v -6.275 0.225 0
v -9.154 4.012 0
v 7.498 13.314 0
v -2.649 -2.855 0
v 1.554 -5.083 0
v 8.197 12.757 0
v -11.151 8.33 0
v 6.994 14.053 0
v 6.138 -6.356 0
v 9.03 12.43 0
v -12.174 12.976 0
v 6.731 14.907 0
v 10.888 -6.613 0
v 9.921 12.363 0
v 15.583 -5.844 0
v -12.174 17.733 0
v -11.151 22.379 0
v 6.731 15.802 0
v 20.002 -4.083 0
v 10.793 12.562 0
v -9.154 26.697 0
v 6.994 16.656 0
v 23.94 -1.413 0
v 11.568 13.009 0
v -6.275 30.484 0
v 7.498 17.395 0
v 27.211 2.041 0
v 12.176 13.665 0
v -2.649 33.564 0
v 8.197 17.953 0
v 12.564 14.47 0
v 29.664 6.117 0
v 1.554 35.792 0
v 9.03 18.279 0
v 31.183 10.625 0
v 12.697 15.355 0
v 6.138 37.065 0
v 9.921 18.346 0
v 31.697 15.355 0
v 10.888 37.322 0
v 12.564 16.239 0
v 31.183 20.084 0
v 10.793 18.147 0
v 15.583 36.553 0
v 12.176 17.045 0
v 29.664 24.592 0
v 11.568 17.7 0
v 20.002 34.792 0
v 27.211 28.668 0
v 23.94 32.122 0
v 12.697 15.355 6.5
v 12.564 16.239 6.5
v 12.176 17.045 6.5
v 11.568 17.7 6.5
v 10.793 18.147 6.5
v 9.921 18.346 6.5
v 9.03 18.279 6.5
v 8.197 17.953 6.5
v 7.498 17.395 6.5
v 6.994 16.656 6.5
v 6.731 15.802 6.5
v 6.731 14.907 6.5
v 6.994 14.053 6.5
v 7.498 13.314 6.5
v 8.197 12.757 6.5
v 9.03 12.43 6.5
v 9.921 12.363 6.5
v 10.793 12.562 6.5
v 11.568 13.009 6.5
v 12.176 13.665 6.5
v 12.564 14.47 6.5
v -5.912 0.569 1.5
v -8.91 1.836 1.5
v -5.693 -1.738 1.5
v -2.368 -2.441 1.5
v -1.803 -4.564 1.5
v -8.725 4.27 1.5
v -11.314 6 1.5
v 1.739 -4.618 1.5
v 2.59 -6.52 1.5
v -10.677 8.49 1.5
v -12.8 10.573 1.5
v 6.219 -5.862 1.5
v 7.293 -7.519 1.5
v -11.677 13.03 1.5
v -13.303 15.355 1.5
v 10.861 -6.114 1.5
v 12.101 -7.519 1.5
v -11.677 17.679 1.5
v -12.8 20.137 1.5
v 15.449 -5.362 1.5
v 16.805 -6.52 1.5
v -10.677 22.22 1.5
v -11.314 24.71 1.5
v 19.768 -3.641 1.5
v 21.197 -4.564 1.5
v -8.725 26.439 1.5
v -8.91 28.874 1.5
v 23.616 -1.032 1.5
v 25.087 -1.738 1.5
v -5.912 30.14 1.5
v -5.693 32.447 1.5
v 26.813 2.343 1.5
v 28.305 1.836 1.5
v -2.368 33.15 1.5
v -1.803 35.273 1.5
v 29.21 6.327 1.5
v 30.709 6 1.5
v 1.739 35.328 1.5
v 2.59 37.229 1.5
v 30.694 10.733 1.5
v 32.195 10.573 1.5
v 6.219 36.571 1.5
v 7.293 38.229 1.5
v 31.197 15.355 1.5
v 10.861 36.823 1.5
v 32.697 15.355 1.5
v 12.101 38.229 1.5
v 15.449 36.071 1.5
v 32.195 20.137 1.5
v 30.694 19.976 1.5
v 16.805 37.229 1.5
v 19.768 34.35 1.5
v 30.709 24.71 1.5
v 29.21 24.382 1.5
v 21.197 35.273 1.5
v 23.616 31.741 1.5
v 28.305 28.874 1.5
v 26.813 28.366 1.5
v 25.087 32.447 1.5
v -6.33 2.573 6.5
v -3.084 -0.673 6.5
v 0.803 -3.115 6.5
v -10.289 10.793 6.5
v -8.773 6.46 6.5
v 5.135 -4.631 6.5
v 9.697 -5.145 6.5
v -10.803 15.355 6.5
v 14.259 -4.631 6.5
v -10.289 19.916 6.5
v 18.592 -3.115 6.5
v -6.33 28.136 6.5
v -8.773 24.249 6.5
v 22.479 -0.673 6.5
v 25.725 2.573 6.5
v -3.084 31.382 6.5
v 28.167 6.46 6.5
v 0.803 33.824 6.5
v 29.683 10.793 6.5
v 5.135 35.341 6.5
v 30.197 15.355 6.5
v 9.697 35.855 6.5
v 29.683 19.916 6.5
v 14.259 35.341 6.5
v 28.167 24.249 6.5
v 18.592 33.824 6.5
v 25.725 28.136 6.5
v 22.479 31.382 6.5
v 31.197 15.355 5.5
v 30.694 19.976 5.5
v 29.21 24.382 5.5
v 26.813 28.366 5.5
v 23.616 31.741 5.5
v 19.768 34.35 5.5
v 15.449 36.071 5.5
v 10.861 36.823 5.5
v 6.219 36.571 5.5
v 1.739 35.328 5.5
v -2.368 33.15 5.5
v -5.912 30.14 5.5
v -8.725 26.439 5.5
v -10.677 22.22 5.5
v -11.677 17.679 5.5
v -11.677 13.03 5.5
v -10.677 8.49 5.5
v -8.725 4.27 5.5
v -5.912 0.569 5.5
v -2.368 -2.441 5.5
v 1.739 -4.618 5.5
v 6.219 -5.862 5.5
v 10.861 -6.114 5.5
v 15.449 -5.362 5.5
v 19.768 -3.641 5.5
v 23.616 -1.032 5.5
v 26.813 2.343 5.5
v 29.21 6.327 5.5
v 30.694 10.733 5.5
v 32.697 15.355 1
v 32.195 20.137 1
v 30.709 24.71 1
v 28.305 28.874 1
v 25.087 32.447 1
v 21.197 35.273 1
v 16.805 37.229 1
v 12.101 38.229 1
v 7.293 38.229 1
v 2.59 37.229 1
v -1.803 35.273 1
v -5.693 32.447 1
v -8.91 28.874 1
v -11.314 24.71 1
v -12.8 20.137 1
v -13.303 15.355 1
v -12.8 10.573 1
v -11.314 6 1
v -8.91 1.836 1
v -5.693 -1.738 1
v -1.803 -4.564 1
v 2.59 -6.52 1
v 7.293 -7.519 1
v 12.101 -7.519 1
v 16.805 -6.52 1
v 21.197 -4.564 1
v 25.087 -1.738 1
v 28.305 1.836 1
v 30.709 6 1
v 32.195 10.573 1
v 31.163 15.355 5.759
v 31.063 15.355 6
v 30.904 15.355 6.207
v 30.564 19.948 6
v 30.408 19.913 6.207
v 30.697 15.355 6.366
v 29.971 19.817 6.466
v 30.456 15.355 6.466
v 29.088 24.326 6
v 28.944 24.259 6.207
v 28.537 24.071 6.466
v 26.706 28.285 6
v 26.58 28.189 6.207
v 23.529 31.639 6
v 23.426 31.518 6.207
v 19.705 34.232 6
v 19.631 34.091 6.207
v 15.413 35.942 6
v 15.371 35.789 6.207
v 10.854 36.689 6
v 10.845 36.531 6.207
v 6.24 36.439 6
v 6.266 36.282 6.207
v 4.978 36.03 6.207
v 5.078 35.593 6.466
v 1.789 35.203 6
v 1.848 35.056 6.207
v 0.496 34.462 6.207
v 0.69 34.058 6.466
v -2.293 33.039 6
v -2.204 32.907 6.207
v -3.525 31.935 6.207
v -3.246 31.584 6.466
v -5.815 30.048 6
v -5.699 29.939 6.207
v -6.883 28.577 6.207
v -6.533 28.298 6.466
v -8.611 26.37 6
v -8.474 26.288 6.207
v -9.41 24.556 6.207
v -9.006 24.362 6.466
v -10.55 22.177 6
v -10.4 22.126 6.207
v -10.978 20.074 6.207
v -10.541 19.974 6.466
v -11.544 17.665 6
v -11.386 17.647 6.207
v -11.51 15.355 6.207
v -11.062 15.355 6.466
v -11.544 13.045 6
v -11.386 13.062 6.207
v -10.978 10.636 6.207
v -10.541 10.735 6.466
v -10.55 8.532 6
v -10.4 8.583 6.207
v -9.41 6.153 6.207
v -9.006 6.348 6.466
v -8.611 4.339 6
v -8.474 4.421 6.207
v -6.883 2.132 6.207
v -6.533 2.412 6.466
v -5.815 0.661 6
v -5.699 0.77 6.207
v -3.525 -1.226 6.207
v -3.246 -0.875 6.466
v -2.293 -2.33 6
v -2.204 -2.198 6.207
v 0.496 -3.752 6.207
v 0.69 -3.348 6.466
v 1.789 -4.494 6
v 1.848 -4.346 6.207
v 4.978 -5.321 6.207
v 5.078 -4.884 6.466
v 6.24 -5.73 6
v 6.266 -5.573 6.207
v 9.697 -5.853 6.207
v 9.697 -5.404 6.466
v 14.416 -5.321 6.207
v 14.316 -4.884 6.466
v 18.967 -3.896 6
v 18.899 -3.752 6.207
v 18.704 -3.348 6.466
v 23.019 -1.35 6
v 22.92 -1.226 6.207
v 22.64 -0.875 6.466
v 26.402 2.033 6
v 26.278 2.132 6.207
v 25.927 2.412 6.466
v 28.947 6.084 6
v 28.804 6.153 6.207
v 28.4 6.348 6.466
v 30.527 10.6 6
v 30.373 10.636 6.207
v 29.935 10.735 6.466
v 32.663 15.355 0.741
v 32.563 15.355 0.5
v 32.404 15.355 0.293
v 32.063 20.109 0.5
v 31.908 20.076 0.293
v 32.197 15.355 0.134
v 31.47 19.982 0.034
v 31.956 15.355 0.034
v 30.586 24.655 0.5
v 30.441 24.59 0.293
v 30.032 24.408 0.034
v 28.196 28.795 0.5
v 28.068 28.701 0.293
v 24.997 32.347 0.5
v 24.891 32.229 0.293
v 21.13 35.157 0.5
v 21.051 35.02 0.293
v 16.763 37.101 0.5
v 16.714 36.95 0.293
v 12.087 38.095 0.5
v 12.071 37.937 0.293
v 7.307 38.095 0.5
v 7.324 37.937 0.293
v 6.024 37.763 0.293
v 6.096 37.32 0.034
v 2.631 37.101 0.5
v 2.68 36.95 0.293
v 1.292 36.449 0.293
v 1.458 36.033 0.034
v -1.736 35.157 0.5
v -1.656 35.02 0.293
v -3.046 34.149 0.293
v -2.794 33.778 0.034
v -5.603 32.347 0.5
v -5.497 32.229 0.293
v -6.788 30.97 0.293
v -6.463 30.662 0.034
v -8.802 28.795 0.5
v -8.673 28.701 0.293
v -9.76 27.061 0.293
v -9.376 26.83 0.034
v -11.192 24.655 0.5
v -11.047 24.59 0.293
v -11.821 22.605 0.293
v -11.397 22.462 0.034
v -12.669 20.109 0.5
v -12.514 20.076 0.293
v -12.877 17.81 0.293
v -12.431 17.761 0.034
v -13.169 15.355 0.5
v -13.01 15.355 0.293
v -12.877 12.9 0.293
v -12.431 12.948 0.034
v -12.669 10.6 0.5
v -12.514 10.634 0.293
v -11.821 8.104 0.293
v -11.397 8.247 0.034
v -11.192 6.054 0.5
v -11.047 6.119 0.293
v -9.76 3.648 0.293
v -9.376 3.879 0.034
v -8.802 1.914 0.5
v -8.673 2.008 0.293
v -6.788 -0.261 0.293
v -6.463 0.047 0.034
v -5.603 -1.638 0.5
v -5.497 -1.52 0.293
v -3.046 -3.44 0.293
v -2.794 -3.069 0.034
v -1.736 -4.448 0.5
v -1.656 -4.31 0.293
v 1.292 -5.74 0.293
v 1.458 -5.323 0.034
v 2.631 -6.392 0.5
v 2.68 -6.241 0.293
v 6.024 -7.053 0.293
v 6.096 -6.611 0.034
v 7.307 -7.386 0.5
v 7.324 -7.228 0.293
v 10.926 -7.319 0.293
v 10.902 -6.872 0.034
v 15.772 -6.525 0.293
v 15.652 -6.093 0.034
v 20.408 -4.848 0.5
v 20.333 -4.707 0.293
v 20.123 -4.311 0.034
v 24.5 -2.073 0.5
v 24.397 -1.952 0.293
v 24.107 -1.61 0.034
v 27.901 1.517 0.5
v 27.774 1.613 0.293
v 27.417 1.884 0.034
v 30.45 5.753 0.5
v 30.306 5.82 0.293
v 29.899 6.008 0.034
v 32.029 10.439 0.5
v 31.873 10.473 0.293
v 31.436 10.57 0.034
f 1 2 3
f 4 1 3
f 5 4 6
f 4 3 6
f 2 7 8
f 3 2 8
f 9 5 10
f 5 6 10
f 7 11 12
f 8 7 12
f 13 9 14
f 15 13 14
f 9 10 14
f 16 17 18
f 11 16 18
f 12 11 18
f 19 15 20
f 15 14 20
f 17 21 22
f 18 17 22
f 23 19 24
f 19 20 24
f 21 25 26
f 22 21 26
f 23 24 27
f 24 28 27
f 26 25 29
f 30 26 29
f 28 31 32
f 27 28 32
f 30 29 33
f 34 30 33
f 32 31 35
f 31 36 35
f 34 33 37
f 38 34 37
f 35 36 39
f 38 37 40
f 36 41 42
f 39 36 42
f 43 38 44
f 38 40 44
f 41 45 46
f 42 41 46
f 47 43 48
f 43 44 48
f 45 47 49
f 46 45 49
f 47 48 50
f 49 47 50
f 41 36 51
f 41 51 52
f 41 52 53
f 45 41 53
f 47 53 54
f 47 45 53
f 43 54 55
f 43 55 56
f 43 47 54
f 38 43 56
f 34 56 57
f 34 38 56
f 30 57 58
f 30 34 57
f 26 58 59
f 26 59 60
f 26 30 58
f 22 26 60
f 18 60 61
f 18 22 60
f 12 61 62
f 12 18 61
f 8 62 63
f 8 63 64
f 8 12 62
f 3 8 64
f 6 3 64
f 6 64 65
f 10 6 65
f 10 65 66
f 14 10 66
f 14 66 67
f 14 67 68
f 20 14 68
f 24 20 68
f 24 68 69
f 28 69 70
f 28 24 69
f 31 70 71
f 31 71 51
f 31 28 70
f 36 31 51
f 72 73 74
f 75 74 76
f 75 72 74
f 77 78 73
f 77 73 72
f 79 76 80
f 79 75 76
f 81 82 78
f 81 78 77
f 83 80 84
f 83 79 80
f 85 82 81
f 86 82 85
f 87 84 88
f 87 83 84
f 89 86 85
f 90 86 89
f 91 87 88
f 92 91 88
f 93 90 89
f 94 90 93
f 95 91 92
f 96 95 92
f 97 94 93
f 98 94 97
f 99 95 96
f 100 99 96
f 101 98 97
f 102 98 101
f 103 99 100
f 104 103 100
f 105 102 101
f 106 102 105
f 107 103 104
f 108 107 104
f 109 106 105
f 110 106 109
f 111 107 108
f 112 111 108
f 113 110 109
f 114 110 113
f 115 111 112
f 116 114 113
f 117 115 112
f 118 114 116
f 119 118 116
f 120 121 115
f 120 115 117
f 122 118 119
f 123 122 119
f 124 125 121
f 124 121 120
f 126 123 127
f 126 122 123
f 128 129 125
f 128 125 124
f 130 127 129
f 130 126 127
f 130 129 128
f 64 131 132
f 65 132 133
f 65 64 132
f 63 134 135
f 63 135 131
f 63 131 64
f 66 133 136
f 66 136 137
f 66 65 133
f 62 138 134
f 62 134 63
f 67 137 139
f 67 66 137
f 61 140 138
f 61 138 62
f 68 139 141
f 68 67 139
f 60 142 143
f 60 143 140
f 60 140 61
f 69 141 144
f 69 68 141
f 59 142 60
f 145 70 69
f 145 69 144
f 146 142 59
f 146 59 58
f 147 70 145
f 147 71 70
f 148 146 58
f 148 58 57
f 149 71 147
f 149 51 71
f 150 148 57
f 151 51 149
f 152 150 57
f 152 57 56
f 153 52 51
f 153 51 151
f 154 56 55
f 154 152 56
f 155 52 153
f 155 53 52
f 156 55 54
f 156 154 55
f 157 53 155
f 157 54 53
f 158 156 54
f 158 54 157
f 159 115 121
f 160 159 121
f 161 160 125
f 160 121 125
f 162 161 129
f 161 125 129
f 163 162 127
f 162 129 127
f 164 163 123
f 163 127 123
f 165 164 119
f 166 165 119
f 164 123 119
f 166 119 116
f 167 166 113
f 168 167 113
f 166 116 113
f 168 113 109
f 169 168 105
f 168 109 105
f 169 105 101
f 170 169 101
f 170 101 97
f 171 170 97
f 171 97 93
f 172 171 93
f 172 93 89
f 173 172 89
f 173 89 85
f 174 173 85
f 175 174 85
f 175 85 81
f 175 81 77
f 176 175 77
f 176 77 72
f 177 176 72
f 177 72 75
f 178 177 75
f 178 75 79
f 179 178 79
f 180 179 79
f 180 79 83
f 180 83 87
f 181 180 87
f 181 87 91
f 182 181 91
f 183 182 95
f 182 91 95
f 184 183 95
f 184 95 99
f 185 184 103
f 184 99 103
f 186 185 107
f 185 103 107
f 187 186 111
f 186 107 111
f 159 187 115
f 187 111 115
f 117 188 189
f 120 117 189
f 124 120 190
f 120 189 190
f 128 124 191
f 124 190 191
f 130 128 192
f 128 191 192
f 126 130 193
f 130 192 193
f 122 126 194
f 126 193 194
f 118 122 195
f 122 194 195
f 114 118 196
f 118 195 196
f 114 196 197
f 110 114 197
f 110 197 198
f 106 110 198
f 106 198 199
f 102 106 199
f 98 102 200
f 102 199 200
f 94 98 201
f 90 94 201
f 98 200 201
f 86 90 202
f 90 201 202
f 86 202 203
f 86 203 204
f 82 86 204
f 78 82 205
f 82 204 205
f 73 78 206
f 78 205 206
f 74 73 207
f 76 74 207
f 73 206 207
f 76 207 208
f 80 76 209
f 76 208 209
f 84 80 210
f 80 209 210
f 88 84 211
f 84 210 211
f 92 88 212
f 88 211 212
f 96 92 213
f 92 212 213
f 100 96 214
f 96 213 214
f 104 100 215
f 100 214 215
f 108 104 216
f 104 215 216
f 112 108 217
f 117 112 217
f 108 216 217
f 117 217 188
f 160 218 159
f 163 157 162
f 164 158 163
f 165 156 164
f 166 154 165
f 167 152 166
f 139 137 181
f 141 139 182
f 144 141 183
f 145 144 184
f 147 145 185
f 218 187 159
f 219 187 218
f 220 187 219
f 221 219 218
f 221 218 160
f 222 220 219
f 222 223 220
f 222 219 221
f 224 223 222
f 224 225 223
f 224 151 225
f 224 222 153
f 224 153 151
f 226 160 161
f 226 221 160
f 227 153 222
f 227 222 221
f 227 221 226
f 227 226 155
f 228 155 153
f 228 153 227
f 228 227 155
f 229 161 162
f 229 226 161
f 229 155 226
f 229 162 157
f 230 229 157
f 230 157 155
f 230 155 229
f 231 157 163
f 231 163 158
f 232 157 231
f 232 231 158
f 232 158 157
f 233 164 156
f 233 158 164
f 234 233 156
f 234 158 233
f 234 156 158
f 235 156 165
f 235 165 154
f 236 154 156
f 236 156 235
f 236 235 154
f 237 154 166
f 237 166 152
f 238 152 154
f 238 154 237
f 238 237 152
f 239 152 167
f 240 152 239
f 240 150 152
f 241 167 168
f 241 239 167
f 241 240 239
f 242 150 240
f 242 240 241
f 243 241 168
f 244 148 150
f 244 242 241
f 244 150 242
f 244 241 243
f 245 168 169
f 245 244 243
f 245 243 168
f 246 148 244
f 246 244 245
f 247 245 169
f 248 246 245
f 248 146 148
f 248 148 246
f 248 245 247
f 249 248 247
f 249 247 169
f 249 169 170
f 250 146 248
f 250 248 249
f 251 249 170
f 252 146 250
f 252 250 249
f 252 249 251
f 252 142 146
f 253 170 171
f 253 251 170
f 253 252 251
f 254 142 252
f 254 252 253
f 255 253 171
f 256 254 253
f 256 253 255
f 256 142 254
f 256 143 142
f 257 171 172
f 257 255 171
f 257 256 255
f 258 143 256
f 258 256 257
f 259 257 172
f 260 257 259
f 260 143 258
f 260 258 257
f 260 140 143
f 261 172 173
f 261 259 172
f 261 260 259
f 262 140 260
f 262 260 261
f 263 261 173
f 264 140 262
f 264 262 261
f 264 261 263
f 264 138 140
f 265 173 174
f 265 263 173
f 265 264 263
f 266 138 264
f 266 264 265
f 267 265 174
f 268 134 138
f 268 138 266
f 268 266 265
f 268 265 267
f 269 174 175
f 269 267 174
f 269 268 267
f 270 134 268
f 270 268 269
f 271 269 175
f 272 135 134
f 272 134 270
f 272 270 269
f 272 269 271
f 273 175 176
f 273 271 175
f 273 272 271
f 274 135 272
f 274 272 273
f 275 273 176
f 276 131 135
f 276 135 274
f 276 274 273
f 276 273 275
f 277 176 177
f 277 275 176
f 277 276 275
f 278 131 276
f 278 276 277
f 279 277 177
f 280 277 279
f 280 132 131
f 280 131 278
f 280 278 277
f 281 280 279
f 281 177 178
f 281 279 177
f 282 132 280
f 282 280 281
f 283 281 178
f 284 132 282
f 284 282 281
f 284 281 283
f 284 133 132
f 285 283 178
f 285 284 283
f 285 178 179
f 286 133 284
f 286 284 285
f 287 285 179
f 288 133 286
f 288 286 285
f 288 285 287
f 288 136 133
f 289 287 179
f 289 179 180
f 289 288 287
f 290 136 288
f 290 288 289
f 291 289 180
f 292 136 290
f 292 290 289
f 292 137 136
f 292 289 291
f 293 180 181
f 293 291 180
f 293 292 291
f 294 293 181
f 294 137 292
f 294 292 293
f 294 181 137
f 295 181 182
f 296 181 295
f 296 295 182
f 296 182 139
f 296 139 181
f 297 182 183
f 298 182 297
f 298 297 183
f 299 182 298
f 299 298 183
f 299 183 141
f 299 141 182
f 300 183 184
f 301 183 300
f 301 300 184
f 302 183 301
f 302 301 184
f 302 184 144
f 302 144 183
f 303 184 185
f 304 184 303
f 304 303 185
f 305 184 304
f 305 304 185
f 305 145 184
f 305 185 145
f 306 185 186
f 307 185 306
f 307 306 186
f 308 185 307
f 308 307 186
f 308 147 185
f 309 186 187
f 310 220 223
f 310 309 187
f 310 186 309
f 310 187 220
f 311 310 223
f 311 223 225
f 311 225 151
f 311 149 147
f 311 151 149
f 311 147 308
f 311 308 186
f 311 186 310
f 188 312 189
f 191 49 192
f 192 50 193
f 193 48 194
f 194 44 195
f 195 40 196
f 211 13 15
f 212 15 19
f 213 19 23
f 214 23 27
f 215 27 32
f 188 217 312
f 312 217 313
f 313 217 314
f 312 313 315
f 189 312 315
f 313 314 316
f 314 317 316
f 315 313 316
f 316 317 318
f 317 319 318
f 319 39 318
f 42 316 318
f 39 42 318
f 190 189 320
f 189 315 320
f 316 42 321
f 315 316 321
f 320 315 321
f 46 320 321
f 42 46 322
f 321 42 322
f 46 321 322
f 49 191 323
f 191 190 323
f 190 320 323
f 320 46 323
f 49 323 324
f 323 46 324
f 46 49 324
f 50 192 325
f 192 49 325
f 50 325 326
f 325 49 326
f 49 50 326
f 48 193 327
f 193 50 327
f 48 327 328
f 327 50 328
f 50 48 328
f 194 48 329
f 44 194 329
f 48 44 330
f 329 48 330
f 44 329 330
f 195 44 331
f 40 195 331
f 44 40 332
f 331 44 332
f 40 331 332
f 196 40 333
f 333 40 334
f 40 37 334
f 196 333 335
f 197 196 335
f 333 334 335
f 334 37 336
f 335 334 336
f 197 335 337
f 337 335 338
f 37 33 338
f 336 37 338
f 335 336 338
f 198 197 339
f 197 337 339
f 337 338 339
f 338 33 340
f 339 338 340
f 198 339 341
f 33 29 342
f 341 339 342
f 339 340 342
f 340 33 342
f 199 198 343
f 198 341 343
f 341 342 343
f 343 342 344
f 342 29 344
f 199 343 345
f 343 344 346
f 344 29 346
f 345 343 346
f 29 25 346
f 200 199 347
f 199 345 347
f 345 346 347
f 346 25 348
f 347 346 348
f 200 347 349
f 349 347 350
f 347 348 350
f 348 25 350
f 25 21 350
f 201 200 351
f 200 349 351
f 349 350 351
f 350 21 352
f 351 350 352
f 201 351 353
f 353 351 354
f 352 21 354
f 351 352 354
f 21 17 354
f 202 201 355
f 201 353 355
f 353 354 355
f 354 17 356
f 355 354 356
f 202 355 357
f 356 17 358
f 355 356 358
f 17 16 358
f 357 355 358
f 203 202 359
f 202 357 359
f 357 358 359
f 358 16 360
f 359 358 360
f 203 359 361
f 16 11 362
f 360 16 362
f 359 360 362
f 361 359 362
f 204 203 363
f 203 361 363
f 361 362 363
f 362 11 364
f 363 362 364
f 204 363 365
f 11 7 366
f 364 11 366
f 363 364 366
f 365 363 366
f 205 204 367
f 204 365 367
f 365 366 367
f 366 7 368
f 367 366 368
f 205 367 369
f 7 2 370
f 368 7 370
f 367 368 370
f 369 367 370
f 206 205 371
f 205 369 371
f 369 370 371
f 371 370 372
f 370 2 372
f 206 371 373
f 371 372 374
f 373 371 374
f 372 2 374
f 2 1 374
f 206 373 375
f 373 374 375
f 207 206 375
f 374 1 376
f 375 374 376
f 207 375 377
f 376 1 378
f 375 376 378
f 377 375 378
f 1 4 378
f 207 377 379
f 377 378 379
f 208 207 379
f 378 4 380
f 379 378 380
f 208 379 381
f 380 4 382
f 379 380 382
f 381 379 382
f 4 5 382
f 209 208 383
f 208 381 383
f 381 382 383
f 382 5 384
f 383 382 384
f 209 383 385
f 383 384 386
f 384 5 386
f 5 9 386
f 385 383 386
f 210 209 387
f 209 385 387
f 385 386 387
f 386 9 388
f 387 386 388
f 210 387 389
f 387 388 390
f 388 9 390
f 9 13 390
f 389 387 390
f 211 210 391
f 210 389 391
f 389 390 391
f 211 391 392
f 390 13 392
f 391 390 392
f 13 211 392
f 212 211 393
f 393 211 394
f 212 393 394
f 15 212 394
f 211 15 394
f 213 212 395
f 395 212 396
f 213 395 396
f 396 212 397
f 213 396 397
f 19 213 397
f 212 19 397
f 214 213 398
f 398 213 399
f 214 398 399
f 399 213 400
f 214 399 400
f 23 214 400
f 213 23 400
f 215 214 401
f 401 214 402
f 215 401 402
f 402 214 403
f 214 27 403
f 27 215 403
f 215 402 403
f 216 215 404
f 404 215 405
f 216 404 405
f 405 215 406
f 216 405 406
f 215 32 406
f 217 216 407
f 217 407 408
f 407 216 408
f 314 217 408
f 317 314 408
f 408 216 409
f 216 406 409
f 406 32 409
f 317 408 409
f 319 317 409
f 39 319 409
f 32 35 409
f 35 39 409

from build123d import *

# Parameters (mm, degrees)
F0_R     = 23
F0_R_2   = 21.5
F1_DEPTH = 1.5
F0_R_3   = 3
F2_DEPTH = 6.5
F3_R     = 1
F4_R     = 1


with BuildPart() as f1:
    # F0 (on Top) → F1 (new body)
    with BuildSketch(Plane.XY):
        with Locations((9.697127, 15.354596)):
            Circle(F0_R)
        with Locations((9.697127, 15.354596)):
            Circle(F0_R_2, mode=Mode.SUBTRACT)
    extrude(amount=F1_DEPTH)

    # F0 (on Top) → F2 (join)
    with BuildSketch(Plane.XY):
        with Locations((9.697127, 15.354596)):
            Circle(F0_R_2)
        with Locations((9.697127, 15.354596)):
            Circle(F0_R_3, mode=Mode.SUBTRACT)
    extrude(amount=F2_DEPTH)

    # F3
    f3_edges = [f1.edges().sort_by_distance(p)[0] for p in [
        (-11.802873, 15.354596, 6.5),
    ]]
    fillet(f3_edges, radius=F3_R)

    # F4
    f4_edges = [f1.edges().sort_by_distance(p)[0] for p in [
        (-13.302873, 15.354596, 0),
    ]]
    fillet(f4_edges, radius=F4_R)


solid = f1.part
